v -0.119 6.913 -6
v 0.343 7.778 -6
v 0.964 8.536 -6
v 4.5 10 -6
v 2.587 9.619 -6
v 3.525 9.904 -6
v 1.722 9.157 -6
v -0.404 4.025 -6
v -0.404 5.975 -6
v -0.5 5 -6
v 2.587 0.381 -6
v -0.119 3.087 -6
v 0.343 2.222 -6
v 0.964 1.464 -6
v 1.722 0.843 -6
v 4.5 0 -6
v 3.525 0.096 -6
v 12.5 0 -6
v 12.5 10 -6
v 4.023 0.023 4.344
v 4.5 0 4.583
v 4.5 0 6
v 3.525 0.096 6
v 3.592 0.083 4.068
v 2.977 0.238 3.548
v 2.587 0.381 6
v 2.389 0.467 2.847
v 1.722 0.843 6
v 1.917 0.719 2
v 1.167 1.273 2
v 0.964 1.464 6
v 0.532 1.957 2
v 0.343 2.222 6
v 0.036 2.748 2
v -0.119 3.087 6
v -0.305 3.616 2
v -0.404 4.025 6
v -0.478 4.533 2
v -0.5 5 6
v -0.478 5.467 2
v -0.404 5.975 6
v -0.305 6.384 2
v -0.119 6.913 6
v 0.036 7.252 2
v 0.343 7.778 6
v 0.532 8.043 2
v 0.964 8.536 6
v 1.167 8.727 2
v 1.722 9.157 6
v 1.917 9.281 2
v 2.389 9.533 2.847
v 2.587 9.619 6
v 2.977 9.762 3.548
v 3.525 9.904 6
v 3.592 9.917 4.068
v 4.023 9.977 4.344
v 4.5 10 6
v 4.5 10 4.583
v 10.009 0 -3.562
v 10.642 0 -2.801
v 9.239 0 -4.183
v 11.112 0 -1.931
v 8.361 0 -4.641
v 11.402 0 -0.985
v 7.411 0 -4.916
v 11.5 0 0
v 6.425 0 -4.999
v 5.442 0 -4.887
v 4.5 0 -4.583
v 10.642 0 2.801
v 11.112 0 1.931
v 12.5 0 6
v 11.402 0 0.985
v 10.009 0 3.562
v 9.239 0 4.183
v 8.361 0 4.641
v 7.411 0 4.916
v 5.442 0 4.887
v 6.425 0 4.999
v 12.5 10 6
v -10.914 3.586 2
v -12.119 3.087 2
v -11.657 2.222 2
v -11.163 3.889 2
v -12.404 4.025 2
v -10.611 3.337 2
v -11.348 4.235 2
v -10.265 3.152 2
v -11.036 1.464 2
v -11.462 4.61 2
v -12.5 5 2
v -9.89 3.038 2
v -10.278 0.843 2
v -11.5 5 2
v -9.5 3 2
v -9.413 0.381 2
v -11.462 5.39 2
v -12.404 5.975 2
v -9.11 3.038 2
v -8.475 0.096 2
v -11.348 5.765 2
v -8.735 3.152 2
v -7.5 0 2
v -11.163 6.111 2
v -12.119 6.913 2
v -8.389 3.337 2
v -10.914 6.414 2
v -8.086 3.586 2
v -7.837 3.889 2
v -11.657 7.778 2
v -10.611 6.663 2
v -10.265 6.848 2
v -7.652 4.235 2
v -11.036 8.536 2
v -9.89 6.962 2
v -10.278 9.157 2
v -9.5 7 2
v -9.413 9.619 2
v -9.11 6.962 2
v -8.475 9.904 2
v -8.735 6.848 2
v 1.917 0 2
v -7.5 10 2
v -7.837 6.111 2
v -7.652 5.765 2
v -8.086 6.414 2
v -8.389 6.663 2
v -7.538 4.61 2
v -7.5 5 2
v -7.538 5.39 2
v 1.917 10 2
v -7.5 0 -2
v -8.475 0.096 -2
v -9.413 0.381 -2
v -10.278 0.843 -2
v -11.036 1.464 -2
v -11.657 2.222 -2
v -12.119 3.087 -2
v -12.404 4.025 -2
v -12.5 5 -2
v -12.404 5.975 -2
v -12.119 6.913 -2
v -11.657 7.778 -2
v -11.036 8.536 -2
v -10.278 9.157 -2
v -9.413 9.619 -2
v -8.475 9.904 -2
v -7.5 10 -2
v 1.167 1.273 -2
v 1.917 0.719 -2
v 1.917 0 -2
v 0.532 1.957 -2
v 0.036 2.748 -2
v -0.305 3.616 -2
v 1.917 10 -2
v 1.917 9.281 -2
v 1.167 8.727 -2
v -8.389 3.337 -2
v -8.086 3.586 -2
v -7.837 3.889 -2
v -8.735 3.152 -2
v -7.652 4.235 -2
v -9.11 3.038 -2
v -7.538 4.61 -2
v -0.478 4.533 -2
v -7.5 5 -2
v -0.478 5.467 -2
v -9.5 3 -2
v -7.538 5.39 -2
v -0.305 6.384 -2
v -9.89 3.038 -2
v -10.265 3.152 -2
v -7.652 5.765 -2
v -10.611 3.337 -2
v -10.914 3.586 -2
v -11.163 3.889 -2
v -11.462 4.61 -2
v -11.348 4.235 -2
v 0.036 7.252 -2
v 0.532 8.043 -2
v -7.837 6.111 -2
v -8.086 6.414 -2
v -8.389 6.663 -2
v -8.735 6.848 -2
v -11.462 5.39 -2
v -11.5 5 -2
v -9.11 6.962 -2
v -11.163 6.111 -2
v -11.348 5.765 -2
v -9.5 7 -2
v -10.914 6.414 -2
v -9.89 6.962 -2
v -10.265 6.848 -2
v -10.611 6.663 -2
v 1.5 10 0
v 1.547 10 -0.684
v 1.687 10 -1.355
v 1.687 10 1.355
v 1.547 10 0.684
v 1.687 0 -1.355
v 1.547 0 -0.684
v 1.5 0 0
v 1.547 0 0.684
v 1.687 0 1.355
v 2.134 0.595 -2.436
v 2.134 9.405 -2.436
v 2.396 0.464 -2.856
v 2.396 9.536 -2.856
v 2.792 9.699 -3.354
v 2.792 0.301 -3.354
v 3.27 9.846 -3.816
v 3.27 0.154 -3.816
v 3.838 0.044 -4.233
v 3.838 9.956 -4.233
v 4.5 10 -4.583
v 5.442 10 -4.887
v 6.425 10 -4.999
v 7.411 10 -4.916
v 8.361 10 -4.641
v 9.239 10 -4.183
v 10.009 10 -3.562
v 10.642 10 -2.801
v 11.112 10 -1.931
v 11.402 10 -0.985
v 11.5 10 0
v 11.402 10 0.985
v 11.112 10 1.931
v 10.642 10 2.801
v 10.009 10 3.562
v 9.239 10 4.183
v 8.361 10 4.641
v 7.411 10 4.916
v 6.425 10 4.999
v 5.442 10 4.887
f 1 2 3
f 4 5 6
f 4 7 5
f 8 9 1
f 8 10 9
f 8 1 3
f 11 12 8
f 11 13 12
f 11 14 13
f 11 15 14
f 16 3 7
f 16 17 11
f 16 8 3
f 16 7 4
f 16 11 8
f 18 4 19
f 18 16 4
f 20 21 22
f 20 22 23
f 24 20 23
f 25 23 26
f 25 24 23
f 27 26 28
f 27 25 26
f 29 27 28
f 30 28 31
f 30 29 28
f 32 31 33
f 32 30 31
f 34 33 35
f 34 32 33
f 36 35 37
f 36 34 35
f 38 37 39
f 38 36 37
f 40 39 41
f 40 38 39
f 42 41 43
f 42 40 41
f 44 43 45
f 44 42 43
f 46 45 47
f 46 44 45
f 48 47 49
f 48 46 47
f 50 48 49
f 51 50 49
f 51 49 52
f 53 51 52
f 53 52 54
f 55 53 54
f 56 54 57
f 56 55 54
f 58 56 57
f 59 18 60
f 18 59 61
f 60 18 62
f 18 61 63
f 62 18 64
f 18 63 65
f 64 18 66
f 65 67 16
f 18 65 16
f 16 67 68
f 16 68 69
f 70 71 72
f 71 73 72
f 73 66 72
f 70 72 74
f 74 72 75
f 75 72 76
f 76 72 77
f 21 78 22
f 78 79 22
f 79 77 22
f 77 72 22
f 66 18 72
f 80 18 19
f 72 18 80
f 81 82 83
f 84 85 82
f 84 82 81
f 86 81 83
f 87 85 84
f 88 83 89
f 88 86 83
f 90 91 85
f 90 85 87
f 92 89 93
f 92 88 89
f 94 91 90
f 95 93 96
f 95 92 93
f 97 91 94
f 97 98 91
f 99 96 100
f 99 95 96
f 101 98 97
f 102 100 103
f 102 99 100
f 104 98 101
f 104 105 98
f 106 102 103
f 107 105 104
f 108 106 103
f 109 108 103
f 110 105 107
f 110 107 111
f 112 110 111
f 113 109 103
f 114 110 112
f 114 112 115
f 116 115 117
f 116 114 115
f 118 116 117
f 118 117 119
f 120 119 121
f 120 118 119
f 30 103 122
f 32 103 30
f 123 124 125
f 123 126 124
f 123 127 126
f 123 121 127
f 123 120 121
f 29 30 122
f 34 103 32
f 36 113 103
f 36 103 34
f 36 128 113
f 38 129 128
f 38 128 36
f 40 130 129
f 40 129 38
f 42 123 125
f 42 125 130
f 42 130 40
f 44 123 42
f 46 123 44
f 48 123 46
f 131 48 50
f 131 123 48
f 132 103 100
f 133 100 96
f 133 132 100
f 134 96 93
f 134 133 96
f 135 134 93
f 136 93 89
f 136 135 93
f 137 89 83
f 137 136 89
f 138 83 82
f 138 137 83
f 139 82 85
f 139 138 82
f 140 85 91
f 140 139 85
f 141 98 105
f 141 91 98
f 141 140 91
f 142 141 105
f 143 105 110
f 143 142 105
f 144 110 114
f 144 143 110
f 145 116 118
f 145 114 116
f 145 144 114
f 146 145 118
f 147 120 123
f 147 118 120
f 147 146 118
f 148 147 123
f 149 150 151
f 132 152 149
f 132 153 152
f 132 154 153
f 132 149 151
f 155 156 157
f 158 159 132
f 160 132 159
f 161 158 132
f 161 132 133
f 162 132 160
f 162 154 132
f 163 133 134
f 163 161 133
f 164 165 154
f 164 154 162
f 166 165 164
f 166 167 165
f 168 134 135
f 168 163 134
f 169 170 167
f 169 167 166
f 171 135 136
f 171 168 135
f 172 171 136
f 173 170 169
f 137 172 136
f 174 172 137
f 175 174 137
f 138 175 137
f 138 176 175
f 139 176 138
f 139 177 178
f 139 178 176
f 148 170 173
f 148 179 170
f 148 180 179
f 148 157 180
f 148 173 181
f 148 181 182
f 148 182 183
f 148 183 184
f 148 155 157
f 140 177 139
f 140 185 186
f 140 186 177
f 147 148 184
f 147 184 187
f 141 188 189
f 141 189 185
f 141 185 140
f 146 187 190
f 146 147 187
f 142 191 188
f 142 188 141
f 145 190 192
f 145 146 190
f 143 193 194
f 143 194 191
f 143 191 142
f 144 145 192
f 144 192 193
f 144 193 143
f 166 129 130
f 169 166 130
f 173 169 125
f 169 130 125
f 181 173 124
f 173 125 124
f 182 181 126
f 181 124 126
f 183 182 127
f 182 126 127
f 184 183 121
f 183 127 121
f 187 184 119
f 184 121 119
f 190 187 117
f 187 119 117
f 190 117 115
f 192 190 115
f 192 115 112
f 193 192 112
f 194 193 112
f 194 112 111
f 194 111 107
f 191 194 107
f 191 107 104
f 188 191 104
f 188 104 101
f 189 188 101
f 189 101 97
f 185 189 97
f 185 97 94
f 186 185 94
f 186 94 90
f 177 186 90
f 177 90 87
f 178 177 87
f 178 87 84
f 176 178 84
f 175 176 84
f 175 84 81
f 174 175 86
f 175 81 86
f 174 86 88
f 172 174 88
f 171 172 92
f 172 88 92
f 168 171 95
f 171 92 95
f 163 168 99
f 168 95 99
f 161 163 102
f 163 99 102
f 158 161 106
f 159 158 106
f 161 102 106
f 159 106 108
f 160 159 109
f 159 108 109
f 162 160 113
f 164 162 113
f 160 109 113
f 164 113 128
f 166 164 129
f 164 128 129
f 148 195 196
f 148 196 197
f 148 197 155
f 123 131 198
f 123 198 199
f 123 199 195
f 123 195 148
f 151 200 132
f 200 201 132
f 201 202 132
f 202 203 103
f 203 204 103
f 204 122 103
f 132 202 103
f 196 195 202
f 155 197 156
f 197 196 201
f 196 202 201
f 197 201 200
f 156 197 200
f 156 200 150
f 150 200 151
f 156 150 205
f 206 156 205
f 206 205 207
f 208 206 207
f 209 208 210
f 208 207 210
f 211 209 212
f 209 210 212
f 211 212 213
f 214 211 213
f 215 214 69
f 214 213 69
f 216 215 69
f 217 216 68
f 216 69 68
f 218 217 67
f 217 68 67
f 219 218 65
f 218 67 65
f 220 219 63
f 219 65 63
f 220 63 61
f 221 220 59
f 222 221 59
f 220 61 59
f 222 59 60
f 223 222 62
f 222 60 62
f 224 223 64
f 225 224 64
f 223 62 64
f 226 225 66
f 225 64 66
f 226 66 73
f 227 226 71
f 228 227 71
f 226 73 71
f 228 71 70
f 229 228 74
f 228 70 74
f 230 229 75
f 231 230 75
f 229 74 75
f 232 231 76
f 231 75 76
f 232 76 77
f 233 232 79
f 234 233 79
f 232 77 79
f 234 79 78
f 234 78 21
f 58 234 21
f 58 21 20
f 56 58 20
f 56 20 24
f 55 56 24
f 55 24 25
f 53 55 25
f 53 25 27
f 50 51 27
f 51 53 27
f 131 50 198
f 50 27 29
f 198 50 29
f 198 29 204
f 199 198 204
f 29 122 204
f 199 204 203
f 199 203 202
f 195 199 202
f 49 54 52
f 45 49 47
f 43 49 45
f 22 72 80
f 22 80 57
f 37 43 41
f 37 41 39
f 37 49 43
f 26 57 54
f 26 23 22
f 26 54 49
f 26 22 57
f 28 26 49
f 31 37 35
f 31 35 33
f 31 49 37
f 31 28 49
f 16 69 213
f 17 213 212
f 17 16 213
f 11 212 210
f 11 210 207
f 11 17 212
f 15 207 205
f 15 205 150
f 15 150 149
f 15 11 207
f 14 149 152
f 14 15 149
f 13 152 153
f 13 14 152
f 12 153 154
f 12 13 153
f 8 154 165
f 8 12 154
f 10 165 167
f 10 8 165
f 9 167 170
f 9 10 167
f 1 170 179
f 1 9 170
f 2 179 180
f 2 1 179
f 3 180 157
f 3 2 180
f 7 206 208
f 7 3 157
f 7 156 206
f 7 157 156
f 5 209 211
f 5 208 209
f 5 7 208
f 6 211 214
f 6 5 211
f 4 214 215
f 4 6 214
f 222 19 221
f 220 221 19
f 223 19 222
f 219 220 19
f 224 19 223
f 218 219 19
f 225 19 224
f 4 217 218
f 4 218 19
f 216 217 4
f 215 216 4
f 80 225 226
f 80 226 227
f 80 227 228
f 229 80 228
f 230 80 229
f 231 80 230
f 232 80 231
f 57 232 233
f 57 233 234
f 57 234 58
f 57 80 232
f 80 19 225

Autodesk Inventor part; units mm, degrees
ref_plane "YZ Plane" through (0, 0, 0) normal (1, 0, 0) x (0, 1, 0)
ref_plane "XZ Plane" through (0, 0, 0) normal (0, 1, 0) x (-1, 0, 0)
ref_plane "XY Plane" through (0, 0, 0) normal (0, 0, 1) x (1, 0, 0)
sketch "Szkic2" plane through (0, 0, 0) normal (0, 1, 0) x (-1, 0, 0)
  line L0 (-12.5, 6) -> (12.5, 6)
  line L1 (12.5, 6) -> (12.5, -6)
  line L2 (12.5, -6) -> (-12.5, -6)
  line L3 (-12.5, -6) -> (-12.5, 6)
  line L4 (-12.5, 6) -> (12.5, -6) construction
  line L5 (12.5, 6) -> (-12.5, -6) construction
  line L6 (-12.5, 0) -> (-6.5, 0)
  circle A0 centre (-6.5, 0) radius 5
  line L7 (12.5, 0) -> (12.5, 2)
  line L8 (12.5, 2) -> (0.5, 2)
  line L9 (0.5, 2) -> (0.5, 6)
  line L10 (12.5, -6) -> (12.5, 6)
  line L11 (12.5, -2) -> (0.5, -2)
  line L12 (0.5, -2) -> (0.5, -6)
  point P0 (0, 0)
  point P1 (0.5, -6)
  point P2 (12.5, -2)
  dimension "d11" = 25
  dimension "d12" = 12
  dimension "d13" = 6
  dimension "d14" = 10
  dimension "d15" = 2
  dimension "d16" = 12
extrude "Wyciągnięcie proste3" add sketch "Szkic2" along normal blind 10 contours L0 L9 L8 L1 L11 L12 L2 L3
sketch "Szkic3" plane through (-12.5, 0, 2) normal (0, 0, 1) x (1, 0, 0)
  line L0 (0, 0) -> (0, 10) projected
  line L1 (12, 0) -> (0, 0) projected
  line L2 (0, 10) -> (0, 0)
  line L3 (12, 0) -> (12, 10) projected
  circle A0 centre (3, 5) radius 2
  point P0 (12.5, 0)
  dimension "d19" = 4
  dimension "d23" = 9
extrude "Wyciągnięcie proste4" cut sketch "Szkic3" against normal blind 32.75
fillet "Zaokrąglenie1" radius 5 6 edges at (-12.5, 0, 0) (-12.5, 10, 0) (-0.5, 0, 4) (-0.5, 10, 4) (-0.5, 0, -4) (-0.5, 10, -4)
properties part number "Knee"
